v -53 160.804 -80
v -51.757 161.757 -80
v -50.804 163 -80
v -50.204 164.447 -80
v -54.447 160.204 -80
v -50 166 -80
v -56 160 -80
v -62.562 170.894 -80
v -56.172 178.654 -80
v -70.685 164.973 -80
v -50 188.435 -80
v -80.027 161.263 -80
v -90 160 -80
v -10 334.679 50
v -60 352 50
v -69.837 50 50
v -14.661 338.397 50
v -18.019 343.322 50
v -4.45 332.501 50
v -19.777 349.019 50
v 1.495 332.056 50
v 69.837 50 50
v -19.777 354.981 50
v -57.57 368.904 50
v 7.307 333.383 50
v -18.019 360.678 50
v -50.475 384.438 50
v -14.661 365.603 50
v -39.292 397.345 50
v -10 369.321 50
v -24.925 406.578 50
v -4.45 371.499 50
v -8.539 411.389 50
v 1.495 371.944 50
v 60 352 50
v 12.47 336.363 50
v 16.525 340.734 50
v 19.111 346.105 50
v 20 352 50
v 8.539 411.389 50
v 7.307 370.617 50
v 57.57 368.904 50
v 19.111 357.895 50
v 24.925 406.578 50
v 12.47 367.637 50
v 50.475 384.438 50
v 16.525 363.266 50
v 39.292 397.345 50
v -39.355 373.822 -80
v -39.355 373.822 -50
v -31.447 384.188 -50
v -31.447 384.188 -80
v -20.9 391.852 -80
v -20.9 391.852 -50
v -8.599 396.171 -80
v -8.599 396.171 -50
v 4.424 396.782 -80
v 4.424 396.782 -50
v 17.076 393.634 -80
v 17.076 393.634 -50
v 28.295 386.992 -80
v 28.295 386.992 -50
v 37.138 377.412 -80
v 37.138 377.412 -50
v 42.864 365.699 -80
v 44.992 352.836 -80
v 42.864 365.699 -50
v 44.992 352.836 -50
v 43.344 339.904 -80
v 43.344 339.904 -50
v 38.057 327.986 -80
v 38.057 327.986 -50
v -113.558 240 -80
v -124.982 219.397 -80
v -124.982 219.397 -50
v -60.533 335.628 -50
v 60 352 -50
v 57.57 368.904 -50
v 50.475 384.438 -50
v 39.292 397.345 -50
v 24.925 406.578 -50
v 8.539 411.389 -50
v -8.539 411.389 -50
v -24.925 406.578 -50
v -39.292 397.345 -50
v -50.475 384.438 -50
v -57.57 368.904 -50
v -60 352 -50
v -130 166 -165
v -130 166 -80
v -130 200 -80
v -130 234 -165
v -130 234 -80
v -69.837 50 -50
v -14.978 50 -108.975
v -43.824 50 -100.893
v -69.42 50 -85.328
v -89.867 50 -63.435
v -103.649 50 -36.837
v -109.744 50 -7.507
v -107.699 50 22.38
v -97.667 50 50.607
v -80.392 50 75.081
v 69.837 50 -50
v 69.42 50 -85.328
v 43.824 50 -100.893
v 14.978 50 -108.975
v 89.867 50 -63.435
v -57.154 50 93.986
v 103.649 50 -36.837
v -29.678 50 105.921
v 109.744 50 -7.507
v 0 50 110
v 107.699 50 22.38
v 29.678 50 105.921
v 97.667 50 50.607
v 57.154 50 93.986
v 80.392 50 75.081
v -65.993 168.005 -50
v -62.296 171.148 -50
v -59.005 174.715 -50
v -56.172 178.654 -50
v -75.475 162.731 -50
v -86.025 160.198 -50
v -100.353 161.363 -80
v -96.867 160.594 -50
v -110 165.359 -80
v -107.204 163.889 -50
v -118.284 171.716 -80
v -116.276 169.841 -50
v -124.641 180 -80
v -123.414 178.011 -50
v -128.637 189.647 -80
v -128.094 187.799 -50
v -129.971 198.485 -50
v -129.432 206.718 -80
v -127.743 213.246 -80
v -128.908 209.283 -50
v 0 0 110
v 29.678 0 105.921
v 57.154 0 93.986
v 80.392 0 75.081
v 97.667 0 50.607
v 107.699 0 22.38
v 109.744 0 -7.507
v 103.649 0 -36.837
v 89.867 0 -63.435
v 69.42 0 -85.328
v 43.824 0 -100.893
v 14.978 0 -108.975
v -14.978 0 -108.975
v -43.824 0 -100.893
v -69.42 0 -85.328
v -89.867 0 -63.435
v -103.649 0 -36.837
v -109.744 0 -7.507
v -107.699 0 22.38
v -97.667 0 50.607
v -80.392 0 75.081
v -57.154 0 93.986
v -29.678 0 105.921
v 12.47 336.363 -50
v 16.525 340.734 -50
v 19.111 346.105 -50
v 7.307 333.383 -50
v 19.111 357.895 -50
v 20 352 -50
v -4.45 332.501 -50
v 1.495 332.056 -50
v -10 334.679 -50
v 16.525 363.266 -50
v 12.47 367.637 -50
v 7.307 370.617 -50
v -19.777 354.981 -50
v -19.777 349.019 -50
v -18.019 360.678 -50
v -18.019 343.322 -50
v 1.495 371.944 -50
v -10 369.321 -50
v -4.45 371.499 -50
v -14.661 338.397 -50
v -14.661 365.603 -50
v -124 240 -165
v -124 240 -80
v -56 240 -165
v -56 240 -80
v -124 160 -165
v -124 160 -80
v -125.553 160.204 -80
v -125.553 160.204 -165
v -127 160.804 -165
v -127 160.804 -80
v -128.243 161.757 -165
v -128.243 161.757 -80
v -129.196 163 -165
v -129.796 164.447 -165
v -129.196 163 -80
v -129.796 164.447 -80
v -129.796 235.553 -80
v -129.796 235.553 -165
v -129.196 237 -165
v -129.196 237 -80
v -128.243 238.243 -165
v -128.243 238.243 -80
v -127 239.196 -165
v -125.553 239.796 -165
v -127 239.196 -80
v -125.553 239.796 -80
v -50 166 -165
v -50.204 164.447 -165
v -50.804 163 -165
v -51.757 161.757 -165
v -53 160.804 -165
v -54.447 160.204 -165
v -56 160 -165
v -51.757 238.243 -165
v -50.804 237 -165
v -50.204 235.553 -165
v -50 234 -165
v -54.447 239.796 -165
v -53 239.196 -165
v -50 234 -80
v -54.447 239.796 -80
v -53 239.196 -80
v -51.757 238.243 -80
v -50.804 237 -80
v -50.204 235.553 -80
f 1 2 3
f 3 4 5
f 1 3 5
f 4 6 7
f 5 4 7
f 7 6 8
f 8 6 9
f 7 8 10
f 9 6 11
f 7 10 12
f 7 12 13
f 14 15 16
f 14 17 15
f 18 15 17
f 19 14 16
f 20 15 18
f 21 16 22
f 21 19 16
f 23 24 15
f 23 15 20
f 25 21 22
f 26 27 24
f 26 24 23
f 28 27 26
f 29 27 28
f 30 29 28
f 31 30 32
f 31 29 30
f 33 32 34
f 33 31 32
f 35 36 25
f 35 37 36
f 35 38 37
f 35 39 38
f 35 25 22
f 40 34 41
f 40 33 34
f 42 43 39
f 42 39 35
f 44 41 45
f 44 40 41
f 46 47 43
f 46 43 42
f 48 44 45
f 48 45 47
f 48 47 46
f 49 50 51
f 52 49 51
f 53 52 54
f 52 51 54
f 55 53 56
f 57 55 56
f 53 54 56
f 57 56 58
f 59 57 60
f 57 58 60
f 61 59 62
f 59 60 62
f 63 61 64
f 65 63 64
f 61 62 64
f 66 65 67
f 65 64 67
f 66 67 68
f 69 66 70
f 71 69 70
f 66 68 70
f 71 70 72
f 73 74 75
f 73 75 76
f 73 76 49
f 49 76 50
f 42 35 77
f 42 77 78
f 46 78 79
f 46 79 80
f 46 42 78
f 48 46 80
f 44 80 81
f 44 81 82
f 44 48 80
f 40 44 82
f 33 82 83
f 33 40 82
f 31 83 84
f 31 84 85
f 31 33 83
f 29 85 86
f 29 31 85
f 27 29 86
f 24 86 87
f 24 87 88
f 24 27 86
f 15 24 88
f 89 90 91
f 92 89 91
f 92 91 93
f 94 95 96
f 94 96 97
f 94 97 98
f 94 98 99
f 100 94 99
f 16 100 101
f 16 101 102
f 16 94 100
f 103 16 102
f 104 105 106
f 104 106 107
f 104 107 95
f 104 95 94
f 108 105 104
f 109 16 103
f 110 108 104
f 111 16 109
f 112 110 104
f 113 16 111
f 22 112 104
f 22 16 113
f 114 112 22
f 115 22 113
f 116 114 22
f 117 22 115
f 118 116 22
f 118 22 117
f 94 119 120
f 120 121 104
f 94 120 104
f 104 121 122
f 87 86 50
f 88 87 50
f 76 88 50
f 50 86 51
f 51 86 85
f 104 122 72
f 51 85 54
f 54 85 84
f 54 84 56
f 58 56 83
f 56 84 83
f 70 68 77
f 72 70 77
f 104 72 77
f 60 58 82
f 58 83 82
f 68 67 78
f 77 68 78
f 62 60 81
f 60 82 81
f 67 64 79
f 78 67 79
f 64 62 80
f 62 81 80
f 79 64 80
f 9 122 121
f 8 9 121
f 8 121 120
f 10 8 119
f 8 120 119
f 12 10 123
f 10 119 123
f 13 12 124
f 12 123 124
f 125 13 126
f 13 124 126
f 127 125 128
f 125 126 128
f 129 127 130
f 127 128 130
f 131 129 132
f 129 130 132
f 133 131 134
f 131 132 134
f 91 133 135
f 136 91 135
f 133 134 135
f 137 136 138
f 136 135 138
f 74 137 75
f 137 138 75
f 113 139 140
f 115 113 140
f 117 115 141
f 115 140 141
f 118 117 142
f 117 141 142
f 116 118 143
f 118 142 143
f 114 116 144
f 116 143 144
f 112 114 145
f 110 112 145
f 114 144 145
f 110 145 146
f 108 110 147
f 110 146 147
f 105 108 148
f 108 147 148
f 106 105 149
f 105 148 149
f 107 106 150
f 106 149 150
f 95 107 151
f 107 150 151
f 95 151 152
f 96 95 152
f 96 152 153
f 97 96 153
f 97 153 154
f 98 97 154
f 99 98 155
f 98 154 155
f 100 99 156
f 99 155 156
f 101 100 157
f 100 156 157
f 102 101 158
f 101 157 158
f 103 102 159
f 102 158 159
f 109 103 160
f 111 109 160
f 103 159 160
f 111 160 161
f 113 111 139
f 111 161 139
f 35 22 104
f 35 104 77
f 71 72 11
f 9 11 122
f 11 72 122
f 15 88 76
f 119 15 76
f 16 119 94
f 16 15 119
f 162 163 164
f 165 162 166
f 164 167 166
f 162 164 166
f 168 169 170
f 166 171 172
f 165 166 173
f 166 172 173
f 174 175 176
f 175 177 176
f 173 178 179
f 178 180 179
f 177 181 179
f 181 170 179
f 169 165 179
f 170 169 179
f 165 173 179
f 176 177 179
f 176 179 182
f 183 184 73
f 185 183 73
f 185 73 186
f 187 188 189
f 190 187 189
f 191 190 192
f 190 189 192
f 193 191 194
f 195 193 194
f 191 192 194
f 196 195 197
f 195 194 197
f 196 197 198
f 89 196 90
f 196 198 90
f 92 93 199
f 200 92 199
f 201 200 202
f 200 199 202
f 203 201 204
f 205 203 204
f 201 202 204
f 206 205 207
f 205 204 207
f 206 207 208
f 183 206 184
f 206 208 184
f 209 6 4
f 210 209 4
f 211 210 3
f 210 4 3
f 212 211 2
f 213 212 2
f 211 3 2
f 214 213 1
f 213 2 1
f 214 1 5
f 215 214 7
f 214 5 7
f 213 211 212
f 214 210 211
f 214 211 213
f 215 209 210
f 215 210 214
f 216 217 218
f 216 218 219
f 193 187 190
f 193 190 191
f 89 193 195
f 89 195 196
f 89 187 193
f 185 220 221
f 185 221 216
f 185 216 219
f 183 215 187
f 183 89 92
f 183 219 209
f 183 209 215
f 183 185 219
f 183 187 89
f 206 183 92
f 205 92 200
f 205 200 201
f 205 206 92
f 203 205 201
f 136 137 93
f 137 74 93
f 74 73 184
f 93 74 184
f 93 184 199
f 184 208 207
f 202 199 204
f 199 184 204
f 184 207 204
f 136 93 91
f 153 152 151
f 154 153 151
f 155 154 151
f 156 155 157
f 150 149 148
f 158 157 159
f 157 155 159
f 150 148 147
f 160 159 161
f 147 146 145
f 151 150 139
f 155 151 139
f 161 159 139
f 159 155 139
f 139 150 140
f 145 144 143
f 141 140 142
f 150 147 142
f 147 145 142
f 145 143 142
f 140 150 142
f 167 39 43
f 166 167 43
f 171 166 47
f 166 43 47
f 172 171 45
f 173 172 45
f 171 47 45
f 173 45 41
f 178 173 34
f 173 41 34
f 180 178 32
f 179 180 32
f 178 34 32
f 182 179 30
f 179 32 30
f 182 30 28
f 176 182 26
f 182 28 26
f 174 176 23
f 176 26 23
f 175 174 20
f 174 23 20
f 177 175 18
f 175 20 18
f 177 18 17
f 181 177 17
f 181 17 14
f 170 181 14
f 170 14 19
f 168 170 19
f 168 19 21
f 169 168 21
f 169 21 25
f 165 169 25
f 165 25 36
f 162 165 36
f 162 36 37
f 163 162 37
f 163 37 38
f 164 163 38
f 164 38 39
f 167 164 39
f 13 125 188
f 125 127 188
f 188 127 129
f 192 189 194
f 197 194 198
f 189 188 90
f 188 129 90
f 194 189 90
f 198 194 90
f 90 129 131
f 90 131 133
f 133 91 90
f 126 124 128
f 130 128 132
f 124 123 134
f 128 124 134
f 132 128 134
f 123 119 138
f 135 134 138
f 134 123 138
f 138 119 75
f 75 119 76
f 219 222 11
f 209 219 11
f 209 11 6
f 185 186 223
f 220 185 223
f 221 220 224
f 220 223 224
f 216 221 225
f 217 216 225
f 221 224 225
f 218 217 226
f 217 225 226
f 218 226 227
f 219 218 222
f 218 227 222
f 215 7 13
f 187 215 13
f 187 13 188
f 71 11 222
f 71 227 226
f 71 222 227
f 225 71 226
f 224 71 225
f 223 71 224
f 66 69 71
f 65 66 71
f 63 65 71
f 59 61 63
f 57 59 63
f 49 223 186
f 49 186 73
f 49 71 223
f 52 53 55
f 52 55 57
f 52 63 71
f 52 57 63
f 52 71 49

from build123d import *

# Parameters (mm, degrees)
ESQUISSE1_R             = 110
BOSS_EXTRU_1_DEPTH      = 50
BOSS_EXTRU_2_DEPTH      = 50
ESQUISSE3_R             = 20
ENL_V_MAT_EXTRU_1_DEPTH = 456.460206824
BOSS_EXTRU_3_DEPTH      = 30
BOSS_EXTRU_4_DEPTH      = 85


with BuildPart() as part:
    # Esquisse1 → Boss.-Extru.1 (new body)
    with BuildSketch(Plane(origin=(0, 0, 0), x_dir=(1, 0, 0), z_dir=(0, 1, 0))):
        Circle(ESQUISSE1_R)
    extrude(amount=BOSS_EXTRU_1_DEPTH)

    # Esquisse2 → Boss.-Extru.2 (add, symmetric)
    with BuildSketch(Plane.XY):
        with BuildLine():
            Line((-70, 45), (70, 45))
            Line((70, 45), (60, 352))
            ThreePointArc((60, 352), (0, 412), (-60, 352))
            Line((-60, 352), (-70, 45))
        make_face()
    extrude(amount=BOSS_EXTRU_2_DEPTH, both=True)

    # Esquisse3 → Enlèv. mat.-Extru.1 (cut, through all)
    with BuildSketch(Plane.XY.offset(50)):
        with Locations((0, 352)):
            Circle(ESQUISSE3_R)
    extrude(amount=-ENL_V_MAT_EXTRU_1_DEPTH, mode=Mode.SUBTRACT)

    # Esquisse4 → Boss.-Extru.3 (add)
    with BuildSketch(Plane(origin=(0, 0, -50), x_dir=(-1, 0, 0), z_dir=(0, 0, -1))):
        with BuildLine():
            Line((-38.056922747, 327.986032584), (56.171624225, 178.654251186))
            ThreePointArc((56.171624225, 178.654251186), (110.379680267, 165.580984438), (124.982074019, 219.397280669))
            Line((124.982074019, 219.397280669), (39.354833271, 373.821940753))
            ThreePointArc((39.354833271, 373.821940753), (-22.9271403, 390.721392507), (-38.056922747, 327.986032584))
        make_face()
    extrude(amount=BOSS_EXTRU_3_DEPTH)

    # Esquisse5 → Boss.-Extru.4 (add)
    with BuildSketch(Plane(origin=(0, 0, -80), x_dir=(-1, 0, 0), z_dir=(0, 0, -1))):
        with BuildLine():
            Line((56, 160), (124, 160))
            ThreePointArc((124, 160), (128.242640687, 161.757359313), (130, 166))
            Line((130, 166), (130, 234))
            ThreePointArc((130, 234), (128.242640687, 238.242640687), (124, 240))
            Line((124, 240), (56, 240))
            ThreePointArc((56, 240), (51.757359313, 238.242640687), (50, 234))
            Line((50, 234), (50, 166))
            ThreePointArc((50, 166), (51.757359313, 161.757359313), (56, 160))
        make_face()
    extrude(amount=BOSS_EXTRU_4_DEPTH)


solid = part.part
